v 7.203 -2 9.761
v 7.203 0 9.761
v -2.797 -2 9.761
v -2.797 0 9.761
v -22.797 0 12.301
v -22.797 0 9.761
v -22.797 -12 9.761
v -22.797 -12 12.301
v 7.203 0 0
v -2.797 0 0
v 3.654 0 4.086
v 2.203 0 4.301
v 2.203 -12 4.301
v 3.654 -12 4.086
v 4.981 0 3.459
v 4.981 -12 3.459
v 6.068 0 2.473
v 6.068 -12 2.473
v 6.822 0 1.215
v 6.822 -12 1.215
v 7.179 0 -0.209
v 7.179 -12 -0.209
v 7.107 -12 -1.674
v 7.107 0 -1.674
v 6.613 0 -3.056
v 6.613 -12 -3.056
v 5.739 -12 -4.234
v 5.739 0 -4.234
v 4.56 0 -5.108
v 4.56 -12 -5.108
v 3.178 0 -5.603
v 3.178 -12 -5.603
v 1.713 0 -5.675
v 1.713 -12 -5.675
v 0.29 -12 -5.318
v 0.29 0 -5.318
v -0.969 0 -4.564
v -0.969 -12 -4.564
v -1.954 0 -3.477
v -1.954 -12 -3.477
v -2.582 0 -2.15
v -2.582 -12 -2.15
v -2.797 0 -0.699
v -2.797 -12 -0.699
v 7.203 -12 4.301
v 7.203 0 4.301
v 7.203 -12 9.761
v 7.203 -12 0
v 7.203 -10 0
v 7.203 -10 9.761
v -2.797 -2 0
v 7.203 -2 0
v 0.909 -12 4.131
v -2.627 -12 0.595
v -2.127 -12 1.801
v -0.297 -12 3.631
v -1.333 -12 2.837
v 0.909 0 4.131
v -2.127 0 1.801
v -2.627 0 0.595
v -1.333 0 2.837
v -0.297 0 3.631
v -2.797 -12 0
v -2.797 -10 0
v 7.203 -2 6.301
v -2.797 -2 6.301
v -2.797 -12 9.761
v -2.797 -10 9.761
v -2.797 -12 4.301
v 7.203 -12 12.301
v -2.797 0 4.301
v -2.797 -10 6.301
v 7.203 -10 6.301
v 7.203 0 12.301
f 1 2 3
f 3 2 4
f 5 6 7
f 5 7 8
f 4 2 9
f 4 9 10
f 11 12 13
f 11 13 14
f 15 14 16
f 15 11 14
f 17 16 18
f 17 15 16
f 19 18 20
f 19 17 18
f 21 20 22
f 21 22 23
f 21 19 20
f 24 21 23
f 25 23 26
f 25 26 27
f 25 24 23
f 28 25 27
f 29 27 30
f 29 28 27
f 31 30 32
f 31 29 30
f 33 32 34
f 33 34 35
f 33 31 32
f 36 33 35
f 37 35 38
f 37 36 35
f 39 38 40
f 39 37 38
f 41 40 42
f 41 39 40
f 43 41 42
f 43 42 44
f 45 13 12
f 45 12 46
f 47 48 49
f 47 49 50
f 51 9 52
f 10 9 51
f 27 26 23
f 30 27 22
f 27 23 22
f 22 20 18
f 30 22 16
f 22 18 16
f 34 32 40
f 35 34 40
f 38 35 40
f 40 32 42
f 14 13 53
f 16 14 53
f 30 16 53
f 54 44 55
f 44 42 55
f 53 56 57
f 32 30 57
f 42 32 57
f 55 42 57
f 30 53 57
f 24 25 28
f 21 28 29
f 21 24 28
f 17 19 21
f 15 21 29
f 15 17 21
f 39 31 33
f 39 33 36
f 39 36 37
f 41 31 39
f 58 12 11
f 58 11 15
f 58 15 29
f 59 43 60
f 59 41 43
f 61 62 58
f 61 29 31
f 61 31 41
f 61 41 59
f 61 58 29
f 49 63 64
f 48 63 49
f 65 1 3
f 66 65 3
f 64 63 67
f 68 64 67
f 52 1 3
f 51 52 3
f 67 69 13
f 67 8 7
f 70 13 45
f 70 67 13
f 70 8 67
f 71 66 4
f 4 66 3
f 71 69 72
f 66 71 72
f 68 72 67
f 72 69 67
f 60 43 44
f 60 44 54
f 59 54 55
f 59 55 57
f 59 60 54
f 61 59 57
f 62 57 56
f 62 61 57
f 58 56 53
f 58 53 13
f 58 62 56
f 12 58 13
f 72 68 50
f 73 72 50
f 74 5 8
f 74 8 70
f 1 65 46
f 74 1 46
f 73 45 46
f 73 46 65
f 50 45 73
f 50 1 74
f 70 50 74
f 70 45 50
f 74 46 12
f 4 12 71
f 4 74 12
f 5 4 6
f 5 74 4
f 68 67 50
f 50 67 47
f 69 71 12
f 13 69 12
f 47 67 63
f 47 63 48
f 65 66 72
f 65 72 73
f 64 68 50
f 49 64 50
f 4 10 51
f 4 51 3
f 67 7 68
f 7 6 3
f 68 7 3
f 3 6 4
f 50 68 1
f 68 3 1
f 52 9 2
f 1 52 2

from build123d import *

# Parameters (mm, degrees)
F0_W      = 30
F0_H      = 2.540322
F1_DEPTH  = 12
F2_W      = 10
F2_H      = 8
F3_DEPTH  = 2
F4_W      = 10
F4_H      = 2
F5_DEPTH  = 8
F6_W      = 10
F6_H      = 8
F7_DEPTH  = 2
F8_R      = 5
F9_DEPTH  = 12
F10_W     = 10
F10_H     = 9.760997
F11_DEPTH = 2
F12_W     = 10
F12_H     = 9.760997
F13_DEPTH = 2


with BuildPart() as f1:
    # F0 (on Front) → F1 (new body)
    with BuildSketch(Plane.XZ):
        with Locations((-7.797013, 11.031158)):
            Rectangle(F0_W, F0_H)
    extrude(amount=F1_DEPTH)

    # F2 (on face) → F3 (join)
    with BuildSketch(Plane(origin=(0, 0, 0), x_dir=(-1, 0, 0), z_dir=(0, 1, 0))):
        with Locations((-2.202987, 8.301319)):
            Rectangle(F2_W, F2_H)
    extrude(amount=-F3_DEPTH)

    # F4 (on face) → F5 (join)
    with BuildSketch(Plane.XZ.offset(2)):
        with Locations((2.202987, 5.301319)):
            Rectangle(F4_W, F4_H)
    extrude(amount=F5_DEPTH)

    # F6 (on face) → F7 (join)
    with BuildSketch(Plane.XZ.offset(12)):
        with Locations((2.202987, 8.301319)):
            Rectangle(F6_W, F6_H)
    extrude(amount=-F7_DEPTH)

    # F8 (on face) → F9 (join)
    with BuildSketch(Plane(origin=(0, 0, 0), x_dir=(-1, 0, 0), z_dir=(0, 1, 0))):
        with Locations((-2.202987, -0.698681)):
            Circle(F8_R)
    extrude(amount=-F9_DEPTH)


with BuildPart() as f11:
    # F10 (on face) → F11 (new body)
    with BuildSketch(Plane.XZ.offset(12)):
        with Locations((2.202987, 4.880498)):
            Rectangle(F10_W, F10_H)
    extrude(amount=-F11_DEPTH)


with BuildPart() as f13:
    # F12 (on face) → F13 (new body)
    with BuildSketch(Plane(origin=(0, 0, 0), x_dir=(-1, 0, 0), z_dir=(0, 1, 0))):
        with Locations((-2.202987, 4.880498)):
            Rectangle(F12_W, F12_H)
    extrude(amount=-F13_DEPTH)


solid = Compound([f1.part, f11.part, f13.part])
